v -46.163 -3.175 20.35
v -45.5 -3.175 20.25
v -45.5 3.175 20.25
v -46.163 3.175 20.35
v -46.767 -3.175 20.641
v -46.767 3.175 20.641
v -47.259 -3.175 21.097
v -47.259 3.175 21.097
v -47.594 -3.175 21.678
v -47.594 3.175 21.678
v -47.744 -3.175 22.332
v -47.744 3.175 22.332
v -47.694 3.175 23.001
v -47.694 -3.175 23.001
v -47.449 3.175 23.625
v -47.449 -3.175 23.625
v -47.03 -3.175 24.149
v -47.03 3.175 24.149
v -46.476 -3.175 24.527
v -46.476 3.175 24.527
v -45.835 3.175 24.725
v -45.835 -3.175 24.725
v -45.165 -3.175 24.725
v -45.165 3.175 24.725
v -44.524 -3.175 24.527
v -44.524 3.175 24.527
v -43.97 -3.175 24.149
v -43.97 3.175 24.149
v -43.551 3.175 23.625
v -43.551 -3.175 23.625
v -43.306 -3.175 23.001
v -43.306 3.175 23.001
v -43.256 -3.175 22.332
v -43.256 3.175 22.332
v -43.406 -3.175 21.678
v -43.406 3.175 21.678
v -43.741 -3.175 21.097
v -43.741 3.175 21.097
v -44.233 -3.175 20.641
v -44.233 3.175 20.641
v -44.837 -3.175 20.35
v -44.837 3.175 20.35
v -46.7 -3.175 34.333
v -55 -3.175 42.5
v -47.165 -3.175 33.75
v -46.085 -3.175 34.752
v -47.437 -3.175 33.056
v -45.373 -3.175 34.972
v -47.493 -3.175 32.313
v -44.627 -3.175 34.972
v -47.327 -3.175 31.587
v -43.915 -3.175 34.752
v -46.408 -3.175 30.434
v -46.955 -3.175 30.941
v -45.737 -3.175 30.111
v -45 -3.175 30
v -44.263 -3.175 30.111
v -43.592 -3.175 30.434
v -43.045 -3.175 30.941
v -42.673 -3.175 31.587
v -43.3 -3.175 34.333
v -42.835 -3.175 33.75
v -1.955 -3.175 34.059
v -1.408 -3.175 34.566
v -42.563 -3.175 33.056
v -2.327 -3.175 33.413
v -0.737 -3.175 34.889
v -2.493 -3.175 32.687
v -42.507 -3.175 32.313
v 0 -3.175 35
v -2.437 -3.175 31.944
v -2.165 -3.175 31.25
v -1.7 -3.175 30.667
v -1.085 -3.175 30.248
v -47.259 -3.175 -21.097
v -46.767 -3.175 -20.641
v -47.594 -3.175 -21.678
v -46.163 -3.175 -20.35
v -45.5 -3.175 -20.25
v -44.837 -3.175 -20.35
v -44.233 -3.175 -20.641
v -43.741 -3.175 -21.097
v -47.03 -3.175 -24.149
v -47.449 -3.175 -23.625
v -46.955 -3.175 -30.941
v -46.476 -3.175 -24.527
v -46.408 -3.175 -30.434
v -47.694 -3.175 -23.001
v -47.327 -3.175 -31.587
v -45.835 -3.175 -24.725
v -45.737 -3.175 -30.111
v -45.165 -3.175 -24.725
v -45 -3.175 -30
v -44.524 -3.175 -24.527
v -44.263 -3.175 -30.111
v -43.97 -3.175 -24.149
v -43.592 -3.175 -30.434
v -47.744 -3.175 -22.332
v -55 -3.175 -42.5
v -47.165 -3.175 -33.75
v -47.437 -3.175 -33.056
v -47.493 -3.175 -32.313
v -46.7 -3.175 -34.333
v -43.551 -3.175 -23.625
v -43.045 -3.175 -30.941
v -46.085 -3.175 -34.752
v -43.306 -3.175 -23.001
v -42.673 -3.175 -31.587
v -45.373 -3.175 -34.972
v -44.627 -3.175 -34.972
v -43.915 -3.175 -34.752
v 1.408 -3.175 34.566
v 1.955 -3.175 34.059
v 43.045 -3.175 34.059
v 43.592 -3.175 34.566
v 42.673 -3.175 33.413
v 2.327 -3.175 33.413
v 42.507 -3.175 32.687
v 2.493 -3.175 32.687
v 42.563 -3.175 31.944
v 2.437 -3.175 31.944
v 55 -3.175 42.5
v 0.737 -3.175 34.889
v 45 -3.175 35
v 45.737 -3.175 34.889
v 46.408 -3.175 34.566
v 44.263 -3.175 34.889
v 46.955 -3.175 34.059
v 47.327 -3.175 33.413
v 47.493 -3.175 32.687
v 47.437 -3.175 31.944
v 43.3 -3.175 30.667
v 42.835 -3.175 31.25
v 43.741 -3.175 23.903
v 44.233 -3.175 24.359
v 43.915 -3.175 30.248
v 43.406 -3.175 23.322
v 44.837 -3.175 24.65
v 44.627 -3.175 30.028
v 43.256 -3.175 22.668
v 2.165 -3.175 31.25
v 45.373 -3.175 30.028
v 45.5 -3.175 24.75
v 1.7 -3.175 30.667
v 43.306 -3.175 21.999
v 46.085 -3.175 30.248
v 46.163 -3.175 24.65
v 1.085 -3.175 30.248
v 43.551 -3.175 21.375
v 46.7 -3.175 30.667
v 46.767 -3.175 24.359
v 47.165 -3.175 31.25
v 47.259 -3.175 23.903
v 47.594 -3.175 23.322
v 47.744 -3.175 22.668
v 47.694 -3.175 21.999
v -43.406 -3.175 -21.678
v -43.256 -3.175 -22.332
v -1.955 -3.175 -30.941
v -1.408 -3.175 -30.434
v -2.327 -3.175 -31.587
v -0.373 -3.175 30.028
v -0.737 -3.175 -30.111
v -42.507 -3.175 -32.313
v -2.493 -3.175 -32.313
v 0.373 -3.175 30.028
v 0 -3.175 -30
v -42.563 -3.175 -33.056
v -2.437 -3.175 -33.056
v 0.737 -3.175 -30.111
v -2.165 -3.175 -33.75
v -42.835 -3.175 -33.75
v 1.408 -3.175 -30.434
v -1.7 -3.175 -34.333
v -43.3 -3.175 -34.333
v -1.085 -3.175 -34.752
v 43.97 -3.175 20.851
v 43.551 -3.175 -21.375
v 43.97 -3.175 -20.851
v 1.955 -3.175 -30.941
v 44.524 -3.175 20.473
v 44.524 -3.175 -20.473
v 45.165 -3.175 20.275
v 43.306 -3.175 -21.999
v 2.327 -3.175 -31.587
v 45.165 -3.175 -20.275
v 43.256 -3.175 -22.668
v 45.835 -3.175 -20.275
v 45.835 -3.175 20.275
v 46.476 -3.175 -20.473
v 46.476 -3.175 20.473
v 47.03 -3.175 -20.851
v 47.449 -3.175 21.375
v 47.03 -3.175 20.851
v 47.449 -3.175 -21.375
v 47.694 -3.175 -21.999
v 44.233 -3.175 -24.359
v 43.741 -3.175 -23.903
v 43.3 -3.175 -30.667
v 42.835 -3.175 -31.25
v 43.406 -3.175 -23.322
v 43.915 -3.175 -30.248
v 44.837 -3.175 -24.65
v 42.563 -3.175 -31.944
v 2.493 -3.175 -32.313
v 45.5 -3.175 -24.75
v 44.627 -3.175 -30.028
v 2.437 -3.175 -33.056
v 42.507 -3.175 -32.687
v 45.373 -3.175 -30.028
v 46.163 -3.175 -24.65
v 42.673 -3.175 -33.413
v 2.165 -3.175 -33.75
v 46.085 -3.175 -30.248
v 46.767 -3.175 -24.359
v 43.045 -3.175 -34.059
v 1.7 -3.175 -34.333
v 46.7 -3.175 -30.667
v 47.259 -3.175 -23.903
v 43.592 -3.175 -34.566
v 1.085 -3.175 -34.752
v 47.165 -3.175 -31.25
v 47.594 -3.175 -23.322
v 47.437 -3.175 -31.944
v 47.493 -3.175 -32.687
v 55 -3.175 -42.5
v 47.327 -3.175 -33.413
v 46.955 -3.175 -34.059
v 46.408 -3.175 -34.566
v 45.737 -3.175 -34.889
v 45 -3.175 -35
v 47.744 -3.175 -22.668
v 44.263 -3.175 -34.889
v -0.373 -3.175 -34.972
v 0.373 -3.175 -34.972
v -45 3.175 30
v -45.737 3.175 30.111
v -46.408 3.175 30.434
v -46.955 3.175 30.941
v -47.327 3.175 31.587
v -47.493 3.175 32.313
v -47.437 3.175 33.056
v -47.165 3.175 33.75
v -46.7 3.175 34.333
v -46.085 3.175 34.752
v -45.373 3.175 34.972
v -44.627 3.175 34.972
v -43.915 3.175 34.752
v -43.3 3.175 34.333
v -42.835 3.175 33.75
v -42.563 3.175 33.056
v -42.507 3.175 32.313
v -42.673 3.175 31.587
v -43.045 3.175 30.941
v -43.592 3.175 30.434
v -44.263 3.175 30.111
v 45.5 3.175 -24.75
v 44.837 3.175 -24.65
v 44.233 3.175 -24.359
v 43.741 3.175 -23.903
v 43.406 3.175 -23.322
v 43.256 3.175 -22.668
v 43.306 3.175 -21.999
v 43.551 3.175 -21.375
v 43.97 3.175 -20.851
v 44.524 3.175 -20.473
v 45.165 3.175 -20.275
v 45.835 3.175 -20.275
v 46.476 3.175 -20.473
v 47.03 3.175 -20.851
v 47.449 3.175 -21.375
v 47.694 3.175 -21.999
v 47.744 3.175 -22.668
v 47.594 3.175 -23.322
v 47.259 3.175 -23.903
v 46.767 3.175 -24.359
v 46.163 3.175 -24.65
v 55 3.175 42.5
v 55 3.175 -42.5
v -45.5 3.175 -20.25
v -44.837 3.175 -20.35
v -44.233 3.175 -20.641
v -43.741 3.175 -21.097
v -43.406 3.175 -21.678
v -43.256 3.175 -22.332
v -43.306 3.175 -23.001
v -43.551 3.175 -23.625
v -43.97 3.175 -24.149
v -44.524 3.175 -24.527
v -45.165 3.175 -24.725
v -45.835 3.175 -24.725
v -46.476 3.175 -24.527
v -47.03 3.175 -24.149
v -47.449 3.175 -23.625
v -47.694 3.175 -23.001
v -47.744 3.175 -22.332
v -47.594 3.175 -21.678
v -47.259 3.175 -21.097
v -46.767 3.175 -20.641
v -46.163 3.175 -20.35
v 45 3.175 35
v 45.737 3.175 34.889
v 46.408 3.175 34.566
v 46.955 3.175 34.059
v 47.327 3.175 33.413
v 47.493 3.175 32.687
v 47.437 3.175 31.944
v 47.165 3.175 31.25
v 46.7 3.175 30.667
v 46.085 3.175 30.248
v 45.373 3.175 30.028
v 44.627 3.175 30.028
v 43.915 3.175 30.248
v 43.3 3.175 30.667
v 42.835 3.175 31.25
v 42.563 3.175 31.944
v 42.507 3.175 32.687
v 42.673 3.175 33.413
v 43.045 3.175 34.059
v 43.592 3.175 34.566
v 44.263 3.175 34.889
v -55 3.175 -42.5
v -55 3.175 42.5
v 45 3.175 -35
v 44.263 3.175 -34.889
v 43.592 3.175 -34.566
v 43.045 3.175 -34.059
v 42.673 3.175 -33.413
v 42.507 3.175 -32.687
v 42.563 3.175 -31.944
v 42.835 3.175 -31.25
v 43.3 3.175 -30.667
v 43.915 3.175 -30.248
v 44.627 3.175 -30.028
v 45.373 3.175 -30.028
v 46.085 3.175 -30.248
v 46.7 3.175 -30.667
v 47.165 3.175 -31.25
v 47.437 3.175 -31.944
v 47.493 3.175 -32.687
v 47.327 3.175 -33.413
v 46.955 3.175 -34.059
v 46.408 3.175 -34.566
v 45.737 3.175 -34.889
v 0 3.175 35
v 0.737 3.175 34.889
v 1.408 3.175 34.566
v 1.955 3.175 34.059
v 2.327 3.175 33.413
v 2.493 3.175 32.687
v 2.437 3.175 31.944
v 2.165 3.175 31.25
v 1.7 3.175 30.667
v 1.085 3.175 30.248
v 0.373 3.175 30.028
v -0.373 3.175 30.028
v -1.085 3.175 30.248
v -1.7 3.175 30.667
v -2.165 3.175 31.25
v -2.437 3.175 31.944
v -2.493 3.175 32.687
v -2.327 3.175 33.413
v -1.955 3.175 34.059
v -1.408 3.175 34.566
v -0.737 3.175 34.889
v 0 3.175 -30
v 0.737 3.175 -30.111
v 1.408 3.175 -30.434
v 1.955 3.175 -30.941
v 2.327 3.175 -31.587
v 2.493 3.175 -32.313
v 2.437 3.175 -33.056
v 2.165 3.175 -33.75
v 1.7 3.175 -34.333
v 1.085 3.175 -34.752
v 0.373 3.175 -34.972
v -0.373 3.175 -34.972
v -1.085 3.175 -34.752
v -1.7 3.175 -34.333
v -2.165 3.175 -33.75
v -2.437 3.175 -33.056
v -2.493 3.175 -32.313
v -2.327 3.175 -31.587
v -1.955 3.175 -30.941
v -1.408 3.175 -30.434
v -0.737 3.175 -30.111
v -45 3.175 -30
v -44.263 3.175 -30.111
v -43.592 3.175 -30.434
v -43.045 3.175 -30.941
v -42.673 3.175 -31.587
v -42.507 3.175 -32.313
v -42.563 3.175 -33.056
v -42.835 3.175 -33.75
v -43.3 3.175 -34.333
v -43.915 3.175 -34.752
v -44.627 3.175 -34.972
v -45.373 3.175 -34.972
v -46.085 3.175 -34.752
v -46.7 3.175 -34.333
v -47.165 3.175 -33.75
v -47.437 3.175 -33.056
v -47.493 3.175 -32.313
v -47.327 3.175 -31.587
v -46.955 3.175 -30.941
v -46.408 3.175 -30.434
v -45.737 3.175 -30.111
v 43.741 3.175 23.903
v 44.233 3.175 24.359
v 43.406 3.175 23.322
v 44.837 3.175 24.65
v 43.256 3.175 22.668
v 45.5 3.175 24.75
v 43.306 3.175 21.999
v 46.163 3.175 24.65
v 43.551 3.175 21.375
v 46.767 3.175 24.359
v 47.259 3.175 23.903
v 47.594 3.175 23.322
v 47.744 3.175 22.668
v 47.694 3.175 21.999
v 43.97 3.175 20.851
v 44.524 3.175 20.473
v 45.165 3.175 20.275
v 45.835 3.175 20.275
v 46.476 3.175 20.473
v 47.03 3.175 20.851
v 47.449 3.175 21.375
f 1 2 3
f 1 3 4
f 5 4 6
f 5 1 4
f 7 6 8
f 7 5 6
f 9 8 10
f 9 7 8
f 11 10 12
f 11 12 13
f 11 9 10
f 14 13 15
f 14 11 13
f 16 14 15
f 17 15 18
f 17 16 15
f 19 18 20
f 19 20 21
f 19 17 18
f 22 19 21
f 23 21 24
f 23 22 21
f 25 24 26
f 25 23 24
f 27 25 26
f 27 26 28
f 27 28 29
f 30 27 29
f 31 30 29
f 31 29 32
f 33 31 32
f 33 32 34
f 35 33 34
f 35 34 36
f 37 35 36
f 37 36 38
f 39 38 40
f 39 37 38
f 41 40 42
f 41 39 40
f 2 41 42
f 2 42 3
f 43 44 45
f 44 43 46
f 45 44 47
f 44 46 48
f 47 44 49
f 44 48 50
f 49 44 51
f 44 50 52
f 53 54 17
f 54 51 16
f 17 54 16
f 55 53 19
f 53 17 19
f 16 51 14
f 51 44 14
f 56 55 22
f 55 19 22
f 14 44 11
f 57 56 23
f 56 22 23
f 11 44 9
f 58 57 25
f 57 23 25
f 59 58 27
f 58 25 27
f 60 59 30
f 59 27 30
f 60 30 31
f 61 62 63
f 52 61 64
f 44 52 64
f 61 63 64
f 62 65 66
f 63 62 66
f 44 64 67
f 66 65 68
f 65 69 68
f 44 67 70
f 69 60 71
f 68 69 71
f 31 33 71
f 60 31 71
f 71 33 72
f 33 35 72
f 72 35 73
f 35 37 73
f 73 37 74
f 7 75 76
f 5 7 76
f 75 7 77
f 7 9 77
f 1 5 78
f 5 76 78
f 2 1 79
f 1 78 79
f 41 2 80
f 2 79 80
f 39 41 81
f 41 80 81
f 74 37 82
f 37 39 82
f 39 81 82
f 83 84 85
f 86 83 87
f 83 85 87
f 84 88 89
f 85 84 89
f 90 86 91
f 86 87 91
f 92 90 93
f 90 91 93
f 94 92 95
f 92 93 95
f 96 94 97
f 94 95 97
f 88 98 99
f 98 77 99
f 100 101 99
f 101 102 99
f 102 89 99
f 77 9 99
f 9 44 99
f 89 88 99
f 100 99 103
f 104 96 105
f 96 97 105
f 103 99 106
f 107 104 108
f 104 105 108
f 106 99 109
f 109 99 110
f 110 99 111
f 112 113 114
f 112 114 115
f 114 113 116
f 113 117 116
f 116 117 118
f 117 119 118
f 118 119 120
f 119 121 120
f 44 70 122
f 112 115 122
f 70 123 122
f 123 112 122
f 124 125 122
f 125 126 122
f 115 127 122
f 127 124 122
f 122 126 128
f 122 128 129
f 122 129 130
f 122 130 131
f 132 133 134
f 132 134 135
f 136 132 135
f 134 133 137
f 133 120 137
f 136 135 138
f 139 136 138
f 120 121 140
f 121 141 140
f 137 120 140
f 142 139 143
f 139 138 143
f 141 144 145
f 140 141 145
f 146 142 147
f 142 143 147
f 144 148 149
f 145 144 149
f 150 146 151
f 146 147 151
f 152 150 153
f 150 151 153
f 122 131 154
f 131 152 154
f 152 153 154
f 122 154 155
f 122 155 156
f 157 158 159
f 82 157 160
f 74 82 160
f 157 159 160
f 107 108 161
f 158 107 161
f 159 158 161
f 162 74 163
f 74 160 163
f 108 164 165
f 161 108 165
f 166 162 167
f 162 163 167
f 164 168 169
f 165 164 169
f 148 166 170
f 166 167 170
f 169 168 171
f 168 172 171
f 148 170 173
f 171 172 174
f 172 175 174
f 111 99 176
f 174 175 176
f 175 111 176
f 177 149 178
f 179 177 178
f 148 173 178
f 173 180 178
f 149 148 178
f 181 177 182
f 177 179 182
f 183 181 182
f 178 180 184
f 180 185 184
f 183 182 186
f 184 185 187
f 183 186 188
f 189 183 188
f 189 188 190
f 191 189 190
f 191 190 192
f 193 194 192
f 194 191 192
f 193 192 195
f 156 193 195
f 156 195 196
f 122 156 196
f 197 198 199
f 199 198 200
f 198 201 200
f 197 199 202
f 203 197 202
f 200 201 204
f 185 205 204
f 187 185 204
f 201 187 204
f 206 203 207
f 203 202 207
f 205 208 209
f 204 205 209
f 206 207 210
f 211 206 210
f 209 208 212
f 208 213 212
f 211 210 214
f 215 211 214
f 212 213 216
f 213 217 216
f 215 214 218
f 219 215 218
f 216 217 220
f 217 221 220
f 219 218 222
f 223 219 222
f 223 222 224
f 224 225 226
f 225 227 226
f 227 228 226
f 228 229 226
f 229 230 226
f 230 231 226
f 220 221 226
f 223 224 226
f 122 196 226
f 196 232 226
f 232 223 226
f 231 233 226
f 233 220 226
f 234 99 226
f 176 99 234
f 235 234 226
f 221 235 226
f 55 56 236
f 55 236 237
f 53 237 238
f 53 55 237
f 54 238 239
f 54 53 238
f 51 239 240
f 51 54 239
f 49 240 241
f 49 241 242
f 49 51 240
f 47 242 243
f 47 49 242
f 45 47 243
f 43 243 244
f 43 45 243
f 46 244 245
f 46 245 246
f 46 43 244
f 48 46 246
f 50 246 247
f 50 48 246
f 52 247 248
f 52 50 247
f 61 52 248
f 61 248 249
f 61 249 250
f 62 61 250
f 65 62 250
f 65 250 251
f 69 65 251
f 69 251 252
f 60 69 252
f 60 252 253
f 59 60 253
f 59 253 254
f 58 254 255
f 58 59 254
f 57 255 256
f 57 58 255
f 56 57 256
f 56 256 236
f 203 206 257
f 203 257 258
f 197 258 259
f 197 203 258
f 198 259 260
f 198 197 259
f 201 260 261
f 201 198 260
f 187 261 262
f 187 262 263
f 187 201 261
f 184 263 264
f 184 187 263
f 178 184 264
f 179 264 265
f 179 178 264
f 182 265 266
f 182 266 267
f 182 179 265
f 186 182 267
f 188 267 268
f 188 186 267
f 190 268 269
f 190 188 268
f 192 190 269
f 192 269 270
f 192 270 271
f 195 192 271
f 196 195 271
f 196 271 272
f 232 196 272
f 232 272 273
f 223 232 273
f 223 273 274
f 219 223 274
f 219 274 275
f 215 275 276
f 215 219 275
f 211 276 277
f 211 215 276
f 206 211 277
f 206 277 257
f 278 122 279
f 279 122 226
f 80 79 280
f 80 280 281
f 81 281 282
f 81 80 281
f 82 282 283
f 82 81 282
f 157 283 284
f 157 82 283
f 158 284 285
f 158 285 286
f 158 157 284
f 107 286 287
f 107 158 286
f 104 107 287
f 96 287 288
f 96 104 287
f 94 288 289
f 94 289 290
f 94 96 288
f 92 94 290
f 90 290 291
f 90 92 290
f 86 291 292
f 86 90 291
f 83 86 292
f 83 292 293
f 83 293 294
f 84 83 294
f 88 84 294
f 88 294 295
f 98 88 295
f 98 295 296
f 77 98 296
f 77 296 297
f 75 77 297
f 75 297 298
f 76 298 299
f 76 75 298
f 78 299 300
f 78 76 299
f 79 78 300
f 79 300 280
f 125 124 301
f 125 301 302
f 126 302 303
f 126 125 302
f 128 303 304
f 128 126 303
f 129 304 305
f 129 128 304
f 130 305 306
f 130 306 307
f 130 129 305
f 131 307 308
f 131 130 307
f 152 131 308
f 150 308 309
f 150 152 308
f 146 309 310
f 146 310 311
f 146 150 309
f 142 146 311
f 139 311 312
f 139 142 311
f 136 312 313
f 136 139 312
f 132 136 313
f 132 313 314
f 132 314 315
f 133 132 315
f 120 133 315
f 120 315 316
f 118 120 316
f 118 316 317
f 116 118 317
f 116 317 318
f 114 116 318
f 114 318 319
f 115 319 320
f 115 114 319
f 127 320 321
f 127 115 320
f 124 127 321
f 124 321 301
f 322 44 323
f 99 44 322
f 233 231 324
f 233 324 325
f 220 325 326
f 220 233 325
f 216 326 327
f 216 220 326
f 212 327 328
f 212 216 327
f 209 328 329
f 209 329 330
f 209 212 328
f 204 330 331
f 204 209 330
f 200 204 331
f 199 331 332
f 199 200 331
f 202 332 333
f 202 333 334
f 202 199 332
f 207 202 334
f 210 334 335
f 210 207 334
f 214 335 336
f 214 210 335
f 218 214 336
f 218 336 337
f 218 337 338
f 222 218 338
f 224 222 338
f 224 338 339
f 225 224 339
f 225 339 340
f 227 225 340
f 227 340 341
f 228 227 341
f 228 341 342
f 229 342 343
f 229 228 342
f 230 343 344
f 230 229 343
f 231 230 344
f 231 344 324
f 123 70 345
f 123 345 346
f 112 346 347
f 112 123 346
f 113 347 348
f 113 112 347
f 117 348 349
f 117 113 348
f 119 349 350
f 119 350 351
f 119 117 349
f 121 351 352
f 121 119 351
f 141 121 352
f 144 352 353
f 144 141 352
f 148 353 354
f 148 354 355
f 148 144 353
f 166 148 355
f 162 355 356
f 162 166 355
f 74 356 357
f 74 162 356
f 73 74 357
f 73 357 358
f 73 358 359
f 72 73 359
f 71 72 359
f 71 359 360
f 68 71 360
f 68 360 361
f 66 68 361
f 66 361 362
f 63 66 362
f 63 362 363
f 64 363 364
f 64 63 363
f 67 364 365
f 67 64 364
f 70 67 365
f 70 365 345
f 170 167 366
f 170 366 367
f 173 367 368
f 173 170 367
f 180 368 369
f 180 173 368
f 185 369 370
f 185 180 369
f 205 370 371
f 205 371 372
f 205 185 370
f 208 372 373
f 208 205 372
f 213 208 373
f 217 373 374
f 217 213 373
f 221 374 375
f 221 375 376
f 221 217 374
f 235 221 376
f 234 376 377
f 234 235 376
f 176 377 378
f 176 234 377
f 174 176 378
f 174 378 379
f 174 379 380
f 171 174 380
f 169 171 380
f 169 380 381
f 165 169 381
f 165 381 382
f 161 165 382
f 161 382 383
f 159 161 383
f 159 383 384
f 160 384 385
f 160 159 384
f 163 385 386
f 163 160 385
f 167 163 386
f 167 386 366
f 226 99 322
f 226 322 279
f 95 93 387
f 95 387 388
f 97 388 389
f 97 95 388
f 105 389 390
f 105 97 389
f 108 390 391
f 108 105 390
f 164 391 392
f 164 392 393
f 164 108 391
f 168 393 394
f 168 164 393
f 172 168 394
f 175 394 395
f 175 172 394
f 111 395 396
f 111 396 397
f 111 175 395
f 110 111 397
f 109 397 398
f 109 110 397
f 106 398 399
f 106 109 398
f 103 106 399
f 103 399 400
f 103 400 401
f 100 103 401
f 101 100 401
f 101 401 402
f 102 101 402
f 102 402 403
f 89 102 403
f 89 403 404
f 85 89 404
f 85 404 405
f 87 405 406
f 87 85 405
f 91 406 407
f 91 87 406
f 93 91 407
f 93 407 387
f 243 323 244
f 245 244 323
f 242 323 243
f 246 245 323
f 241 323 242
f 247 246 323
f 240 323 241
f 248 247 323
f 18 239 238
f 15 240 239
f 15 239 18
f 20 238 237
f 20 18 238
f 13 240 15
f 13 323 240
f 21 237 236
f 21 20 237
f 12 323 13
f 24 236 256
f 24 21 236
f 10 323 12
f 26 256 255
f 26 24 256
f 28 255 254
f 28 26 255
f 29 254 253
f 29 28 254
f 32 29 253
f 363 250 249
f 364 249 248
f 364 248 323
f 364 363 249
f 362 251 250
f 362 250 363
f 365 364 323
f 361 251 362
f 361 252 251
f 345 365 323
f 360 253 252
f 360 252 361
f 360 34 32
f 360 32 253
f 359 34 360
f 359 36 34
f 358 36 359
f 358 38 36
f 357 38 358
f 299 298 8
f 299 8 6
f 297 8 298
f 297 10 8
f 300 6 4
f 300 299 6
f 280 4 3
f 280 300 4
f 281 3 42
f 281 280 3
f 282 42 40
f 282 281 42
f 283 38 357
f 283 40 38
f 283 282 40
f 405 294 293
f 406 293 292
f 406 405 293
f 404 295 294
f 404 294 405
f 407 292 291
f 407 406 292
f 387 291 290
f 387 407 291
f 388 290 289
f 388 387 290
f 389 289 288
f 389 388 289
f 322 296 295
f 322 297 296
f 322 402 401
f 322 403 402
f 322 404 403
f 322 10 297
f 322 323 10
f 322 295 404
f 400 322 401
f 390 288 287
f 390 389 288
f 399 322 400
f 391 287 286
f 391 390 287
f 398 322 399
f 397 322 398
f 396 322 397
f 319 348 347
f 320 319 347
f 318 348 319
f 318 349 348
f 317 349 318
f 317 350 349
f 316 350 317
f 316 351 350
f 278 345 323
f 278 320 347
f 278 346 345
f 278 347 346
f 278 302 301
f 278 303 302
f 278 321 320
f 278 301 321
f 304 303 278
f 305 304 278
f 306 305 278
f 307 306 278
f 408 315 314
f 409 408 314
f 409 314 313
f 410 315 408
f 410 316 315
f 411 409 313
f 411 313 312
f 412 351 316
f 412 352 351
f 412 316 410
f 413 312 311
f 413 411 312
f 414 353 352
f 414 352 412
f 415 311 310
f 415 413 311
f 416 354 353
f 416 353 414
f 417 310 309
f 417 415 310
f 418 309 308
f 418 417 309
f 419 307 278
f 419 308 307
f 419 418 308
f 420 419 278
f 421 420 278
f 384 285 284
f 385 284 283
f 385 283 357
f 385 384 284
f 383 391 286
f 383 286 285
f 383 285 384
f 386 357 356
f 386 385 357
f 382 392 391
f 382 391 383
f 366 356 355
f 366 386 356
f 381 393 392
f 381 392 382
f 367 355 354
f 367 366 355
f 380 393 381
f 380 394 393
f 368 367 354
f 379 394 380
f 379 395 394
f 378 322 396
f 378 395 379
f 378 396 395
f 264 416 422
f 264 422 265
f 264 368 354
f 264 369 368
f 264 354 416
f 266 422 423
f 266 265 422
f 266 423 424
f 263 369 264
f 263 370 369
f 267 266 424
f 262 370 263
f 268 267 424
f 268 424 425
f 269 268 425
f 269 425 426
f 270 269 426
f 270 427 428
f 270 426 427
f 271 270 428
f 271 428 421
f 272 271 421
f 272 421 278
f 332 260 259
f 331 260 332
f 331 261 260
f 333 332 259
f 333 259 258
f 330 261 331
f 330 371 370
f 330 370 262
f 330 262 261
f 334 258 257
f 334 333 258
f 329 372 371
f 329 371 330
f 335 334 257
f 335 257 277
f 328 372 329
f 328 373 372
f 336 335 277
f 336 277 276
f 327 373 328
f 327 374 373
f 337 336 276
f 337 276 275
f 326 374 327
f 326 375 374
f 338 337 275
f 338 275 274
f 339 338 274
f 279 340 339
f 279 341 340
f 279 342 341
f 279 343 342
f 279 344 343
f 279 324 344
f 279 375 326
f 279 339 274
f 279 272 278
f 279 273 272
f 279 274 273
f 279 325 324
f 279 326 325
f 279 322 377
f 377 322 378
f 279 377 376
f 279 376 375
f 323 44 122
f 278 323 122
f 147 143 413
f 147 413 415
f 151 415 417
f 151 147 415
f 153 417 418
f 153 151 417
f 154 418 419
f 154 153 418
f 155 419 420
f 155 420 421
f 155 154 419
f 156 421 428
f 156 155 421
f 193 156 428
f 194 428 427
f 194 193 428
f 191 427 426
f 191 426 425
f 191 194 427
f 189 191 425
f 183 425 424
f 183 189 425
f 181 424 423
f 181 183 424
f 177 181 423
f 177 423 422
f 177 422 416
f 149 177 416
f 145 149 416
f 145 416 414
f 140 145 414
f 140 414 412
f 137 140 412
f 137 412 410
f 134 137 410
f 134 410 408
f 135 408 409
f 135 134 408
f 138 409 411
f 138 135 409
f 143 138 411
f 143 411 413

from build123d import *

# Parameters (mm, degrees)
BOSS_EXTRUDE1_DEPTH      = 3.175
BOSS_EXTRUDE1_DEPTH_BACK = 3.175
SKETCH1_W                = 110
SKETCH1_H                = 85
SKETCH1_R                = 2.25
SKETCH1_R_2              = 2.5


with BuildPart() as part:
    # Sketch1 → Boss-Extrude1 (new, two sides: drawn at the far end of the back side and taken through both)
    with BuildSketch(Plane(origin=(0, 0, 0), x_dir=(1, 0, 0), z_dir=(0, 1, 0)).offset(-BOSS_EXTRUDE1_DEPTH_BACK)):
        Rectangle(SKETCH1_W, SKETCH1_H)
        with Locations((-45.5, 22.5)):
            Circle(SKETCH1_R, mode=Mode.SUBTRACT)
        with Locations((45.5, 22.5)):
            Circle(SKETCH1_R, mode=Mode.SUBTRACT)
        with Locations((45.5, -22.5)):
            Circle(SKETCH1_R, mode=Mode.SUBTRACT)
        with Locations((-45.5, -22.5)):
            Circle(SKETCH1_R, mode=Mode.SUBTRACT)
        with Locations((45, -32.5)):
            Circle(SKETCH1_R_2, mode=Mode.SUBTRACT)
        with Locations((-45, -32.5)):
            Circle(SKETCH1_R_2, mode=Mode.SUBTRACT)
        with Locations((-45, 32.5)):
            Circle(SKETCH1_R_2, mode=Mode.SUBTRACT)
        with Locations((45, 32.5)):
            Circle(SKETCH1_R_2, mode=Mode.SUBTRACT)
        with Locations((0, -32.5)):
            Circle(SKETCH1_R_2, mode=Mode.SUBTRACT)
        with Locations((0, 32.5)):
            Circle(SKETCH1_R_2, mode=Mode.SUBTRACT)
    extrude(amount=BOSS_EXTRUDE1_DEPTH + BOSS_EXTRUDE1_DEPTH_BACK)


solid = part.part
